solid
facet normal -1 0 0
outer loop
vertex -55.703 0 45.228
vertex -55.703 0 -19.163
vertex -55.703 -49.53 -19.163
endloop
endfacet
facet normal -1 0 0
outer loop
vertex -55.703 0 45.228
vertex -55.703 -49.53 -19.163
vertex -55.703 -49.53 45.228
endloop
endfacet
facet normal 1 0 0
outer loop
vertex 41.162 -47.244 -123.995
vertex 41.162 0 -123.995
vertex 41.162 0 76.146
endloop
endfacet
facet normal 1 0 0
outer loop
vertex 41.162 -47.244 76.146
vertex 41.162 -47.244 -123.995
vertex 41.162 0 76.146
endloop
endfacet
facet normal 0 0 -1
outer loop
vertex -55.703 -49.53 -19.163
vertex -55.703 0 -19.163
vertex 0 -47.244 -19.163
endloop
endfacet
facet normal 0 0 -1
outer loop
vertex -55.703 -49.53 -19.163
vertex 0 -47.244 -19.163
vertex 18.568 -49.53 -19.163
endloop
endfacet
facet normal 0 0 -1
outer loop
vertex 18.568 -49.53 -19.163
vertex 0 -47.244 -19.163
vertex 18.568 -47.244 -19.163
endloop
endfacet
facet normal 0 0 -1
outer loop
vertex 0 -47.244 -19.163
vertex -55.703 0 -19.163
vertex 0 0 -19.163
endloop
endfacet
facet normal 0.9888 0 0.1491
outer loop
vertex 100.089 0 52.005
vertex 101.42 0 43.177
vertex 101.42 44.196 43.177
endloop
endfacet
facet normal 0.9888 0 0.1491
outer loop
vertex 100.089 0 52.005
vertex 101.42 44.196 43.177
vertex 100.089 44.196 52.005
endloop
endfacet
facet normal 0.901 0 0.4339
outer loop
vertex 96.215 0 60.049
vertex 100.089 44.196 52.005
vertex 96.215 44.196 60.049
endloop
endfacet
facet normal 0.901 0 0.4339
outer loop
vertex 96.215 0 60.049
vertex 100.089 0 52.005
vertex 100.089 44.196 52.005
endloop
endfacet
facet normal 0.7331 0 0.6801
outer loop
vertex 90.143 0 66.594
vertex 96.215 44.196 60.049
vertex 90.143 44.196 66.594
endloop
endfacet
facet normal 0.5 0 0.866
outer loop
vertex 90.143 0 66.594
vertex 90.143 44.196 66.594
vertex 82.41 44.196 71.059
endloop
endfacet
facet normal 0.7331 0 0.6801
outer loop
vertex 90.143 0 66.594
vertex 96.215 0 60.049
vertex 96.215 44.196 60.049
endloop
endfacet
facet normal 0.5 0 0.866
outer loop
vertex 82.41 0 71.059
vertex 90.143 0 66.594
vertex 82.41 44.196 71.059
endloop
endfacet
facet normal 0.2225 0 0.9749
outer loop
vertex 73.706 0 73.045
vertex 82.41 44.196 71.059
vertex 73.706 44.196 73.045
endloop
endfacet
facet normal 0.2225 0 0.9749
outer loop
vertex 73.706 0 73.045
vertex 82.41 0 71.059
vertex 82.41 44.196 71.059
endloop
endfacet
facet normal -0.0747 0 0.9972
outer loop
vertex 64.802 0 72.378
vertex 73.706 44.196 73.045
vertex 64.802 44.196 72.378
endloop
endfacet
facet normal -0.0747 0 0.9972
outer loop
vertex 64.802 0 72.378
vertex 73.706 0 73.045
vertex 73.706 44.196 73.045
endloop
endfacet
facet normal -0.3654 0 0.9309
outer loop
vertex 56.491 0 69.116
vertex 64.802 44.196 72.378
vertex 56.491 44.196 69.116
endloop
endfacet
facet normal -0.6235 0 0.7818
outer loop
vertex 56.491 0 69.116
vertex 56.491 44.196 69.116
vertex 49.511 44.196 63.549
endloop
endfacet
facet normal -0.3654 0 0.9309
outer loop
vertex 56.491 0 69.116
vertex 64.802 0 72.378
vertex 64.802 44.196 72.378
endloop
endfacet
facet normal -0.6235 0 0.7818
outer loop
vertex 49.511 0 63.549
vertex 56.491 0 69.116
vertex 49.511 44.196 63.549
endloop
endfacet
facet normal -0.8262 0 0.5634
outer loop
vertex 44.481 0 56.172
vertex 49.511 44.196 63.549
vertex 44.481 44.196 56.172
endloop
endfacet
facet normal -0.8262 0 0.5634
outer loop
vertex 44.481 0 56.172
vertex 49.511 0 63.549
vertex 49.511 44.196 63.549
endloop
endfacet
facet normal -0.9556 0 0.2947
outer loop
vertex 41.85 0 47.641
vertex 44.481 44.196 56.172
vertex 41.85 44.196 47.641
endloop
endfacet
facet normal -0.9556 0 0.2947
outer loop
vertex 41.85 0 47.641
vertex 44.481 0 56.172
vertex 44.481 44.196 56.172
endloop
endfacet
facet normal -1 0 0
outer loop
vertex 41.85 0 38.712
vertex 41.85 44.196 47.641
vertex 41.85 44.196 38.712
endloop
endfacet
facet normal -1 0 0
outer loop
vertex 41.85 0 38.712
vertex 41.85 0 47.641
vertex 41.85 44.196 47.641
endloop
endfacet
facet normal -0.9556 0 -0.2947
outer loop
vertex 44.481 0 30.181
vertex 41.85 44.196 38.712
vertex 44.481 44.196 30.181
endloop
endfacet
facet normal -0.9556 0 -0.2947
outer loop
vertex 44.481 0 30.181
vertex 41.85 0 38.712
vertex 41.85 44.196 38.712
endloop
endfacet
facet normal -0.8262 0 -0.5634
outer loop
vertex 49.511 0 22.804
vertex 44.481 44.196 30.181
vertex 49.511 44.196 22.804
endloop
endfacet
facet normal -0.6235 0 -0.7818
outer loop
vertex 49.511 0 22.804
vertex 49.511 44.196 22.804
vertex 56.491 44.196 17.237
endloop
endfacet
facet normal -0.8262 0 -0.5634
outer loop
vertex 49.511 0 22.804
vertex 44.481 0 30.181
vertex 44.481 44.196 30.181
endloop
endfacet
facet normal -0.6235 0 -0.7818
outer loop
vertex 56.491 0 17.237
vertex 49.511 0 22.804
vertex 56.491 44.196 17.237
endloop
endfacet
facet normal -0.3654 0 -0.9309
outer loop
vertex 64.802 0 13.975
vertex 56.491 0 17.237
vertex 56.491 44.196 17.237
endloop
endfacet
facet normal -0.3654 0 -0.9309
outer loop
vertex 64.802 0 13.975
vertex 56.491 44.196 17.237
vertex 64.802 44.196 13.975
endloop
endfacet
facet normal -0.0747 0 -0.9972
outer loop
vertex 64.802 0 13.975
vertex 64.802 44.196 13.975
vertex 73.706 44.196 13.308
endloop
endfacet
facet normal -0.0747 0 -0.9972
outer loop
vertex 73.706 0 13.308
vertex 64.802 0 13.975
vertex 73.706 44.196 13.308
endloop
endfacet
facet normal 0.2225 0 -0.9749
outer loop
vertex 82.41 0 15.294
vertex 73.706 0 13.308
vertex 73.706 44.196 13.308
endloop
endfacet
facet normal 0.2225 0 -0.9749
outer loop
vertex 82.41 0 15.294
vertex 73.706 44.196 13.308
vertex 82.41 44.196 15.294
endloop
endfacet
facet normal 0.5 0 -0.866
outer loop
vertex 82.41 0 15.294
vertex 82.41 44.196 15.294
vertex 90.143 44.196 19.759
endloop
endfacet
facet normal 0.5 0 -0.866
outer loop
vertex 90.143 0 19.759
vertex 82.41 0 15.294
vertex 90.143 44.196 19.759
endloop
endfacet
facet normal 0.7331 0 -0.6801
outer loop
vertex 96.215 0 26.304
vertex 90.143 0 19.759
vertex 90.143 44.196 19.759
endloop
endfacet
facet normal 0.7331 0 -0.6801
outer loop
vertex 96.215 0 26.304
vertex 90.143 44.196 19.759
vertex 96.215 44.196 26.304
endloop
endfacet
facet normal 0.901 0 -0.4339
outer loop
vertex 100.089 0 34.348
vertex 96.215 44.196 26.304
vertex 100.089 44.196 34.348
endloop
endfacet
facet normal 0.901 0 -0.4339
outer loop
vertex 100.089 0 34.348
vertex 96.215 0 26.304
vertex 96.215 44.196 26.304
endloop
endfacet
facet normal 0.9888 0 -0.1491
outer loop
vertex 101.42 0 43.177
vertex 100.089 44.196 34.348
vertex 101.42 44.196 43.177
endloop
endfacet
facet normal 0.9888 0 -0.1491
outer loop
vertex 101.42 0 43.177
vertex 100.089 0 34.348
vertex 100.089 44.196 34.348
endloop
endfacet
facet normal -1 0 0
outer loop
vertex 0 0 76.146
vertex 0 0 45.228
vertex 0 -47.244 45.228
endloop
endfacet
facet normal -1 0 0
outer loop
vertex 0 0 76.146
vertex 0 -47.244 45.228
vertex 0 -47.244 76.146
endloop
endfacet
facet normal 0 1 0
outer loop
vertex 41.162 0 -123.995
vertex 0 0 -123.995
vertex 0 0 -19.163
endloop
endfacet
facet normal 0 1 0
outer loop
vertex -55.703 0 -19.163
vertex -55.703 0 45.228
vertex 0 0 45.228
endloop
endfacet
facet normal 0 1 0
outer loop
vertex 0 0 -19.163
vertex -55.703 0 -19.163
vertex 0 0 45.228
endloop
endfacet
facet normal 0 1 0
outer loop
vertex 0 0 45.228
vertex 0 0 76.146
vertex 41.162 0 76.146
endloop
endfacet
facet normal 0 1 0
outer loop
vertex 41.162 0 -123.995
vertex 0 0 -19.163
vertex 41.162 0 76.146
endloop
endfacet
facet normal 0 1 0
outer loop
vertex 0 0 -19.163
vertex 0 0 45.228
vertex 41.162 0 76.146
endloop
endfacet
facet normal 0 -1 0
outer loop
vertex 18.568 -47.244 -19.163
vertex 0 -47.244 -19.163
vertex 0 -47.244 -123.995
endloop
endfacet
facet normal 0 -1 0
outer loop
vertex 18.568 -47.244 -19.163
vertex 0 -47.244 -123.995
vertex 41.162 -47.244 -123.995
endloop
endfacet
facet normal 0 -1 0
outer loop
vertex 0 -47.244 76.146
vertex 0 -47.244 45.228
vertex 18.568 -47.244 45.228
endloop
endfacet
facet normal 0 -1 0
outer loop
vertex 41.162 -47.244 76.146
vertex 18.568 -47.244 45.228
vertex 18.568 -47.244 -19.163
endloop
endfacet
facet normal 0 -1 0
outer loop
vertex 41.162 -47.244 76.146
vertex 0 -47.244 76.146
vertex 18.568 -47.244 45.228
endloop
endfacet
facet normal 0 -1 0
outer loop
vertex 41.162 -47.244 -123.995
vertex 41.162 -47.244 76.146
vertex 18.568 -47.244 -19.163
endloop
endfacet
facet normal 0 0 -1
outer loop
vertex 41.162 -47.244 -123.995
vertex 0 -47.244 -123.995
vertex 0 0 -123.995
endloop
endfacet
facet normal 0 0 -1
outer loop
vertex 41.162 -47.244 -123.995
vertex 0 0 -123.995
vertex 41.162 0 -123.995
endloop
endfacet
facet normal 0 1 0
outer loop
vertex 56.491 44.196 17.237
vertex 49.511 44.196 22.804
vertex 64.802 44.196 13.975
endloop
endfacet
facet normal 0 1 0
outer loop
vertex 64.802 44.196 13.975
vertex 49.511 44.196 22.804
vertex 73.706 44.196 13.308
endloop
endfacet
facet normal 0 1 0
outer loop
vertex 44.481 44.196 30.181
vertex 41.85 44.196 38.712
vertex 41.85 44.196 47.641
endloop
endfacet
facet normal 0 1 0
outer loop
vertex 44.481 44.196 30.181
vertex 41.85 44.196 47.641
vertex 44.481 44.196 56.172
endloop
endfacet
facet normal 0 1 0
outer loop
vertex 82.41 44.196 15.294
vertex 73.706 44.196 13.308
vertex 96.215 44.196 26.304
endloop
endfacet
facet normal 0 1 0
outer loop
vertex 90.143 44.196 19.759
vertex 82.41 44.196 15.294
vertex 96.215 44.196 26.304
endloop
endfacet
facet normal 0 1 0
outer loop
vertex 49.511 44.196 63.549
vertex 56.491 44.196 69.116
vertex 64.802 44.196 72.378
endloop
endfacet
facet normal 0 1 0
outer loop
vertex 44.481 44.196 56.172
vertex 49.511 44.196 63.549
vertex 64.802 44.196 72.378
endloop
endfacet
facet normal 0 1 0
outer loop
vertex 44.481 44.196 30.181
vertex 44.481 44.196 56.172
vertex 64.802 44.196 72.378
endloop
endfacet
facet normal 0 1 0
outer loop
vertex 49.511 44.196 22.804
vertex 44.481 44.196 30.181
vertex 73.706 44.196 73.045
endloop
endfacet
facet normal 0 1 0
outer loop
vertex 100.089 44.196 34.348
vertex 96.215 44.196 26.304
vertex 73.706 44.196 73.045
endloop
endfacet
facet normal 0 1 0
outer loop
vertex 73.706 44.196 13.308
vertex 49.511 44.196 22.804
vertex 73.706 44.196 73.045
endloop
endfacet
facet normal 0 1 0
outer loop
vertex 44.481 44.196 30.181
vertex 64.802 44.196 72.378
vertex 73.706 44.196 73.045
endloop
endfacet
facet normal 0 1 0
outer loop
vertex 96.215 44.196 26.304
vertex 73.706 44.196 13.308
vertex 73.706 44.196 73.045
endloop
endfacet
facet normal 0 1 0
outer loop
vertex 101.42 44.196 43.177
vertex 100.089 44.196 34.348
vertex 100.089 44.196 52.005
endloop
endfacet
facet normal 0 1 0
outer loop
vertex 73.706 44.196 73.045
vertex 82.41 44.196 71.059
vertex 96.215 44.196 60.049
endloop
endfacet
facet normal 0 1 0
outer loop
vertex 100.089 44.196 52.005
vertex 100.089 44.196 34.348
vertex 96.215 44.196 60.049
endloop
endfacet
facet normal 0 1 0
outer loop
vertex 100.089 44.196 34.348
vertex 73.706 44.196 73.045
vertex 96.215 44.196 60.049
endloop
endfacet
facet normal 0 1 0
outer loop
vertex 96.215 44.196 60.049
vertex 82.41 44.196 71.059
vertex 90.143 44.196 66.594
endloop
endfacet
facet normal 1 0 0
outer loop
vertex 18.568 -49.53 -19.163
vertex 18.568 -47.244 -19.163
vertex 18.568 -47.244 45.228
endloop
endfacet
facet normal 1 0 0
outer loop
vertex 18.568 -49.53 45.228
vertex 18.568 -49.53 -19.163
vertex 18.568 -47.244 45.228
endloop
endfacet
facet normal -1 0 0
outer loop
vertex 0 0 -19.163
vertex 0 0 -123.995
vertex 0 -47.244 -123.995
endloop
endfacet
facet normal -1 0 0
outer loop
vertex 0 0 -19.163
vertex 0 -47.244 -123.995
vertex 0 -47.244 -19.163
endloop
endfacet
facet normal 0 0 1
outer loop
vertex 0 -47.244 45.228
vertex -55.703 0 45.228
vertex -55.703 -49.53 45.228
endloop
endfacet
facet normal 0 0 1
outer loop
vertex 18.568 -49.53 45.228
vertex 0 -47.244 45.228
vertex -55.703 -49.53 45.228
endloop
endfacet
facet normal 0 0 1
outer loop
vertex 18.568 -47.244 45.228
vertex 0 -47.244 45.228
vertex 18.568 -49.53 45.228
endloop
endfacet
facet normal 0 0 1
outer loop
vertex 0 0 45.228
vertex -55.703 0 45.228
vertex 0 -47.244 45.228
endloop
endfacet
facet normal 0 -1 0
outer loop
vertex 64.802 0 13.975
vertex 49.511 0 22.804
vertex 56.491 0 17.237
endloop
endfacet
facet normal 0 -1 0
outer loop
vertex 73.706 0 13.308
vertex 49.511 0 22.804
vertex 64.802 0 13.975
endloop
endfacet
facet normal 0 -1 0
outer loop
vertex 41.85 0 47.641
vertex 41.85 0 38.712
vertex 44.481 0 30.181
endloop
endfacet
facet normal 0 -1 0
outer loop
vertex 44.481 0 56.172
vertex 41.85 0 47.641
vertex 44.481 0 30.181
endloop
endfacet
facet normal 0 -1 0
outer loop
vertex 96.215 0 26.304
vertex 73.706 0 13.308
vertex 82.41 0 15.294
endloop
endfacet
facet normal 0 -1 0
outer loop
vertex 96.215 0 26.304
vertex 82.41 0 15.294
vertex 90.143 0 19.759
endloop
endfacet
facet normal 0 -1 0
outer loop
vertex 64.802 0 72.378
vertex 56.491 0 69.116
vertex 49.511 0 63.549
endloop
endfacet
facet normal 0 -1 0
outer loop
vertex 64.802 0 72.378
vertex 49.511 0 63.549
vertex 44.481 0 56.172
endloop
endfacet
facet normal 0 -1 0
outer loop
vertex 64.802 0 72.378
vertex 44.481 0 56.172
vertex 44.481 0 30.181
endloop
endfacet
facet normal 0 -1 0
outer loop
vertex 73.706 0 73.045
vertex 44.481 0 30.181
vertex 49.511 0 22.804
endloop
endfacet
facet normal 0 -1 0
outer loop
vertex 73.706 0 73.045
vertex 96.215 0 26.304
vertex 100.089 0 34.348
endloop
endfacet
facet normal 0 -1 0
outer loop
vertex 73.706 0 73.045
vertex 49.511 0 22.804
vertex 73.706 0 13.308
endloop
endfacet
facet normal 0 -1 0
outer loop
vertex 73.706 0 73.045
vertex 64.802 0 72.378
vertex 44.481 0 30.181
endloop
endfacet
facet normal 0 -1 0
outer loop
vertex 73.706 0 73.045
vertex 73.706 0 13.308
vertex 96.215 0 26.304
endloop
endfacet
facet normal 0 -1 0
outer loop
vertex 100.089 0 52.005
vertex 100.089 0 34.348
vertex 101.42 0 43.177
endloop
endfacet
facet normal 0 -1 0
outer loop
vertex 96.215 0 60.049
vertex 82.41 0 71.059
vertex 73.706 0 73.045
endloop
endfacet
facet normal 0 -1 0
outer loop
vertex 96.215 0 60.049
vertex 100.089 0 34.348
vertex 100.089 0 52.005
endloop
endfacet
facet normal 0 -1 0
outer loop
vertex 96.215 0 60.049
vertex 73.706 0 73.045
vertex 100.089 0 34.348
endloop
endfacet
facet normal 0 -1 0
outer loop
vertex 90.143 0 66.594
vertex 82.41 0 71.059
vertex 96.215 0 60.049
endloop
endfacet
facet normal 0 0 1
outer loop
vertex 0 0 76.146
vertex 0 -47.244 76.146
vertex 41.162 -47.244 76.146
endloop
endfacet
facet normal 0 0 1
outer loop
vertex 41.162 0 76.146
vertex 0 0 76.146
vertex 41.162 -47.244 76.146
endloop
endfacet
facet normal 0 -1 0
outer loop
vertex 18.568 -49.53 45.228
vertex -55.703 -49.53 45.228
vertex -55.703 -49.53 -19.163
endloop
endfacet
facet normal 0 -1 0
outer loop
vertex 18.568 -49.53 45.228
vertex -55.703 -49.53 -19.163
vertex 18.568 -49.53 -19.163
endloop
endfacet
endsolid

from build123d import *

# Parameters (mm, degrees)
F0_W     = 74.27104
F0_H     = 64.391913
F1_DEPTH = 49.53
F2_W     = 41.161664
F2_H     = 200.141754
F3_DEPTH = 47.244
F4_R     = 29.952556
F5_DEPTH = 44.196


with BuildPart() as f1:
    # F0 (on Front) → F1 (new body)
    with BuildSketch(Plane.XZ):
        with Locations((-18.567762, 13.032543)):
            Rectangle(F0_W, F0_H)
    extrude(amount=F1_DEPTH)

    # F2 (on Front) → F3 (join)
    with BuildSketch(Plane.XZ):
        with Locations((20.580832, -23.924412)):
            Rectangle(F2_W, F2_H)
    extrude(amount=F3_DEPTH)


with BuildPart() as f5:
    # F4 (on Front) → F5 (new body)
    with BuildSketch(Plane.XZ):
        with Locations((71.467511, 43.176543)):
            Circle(F4_R)
    extrude(amount=-F5_DEPTH)


solid = Compound([f1.part, f5.part])
